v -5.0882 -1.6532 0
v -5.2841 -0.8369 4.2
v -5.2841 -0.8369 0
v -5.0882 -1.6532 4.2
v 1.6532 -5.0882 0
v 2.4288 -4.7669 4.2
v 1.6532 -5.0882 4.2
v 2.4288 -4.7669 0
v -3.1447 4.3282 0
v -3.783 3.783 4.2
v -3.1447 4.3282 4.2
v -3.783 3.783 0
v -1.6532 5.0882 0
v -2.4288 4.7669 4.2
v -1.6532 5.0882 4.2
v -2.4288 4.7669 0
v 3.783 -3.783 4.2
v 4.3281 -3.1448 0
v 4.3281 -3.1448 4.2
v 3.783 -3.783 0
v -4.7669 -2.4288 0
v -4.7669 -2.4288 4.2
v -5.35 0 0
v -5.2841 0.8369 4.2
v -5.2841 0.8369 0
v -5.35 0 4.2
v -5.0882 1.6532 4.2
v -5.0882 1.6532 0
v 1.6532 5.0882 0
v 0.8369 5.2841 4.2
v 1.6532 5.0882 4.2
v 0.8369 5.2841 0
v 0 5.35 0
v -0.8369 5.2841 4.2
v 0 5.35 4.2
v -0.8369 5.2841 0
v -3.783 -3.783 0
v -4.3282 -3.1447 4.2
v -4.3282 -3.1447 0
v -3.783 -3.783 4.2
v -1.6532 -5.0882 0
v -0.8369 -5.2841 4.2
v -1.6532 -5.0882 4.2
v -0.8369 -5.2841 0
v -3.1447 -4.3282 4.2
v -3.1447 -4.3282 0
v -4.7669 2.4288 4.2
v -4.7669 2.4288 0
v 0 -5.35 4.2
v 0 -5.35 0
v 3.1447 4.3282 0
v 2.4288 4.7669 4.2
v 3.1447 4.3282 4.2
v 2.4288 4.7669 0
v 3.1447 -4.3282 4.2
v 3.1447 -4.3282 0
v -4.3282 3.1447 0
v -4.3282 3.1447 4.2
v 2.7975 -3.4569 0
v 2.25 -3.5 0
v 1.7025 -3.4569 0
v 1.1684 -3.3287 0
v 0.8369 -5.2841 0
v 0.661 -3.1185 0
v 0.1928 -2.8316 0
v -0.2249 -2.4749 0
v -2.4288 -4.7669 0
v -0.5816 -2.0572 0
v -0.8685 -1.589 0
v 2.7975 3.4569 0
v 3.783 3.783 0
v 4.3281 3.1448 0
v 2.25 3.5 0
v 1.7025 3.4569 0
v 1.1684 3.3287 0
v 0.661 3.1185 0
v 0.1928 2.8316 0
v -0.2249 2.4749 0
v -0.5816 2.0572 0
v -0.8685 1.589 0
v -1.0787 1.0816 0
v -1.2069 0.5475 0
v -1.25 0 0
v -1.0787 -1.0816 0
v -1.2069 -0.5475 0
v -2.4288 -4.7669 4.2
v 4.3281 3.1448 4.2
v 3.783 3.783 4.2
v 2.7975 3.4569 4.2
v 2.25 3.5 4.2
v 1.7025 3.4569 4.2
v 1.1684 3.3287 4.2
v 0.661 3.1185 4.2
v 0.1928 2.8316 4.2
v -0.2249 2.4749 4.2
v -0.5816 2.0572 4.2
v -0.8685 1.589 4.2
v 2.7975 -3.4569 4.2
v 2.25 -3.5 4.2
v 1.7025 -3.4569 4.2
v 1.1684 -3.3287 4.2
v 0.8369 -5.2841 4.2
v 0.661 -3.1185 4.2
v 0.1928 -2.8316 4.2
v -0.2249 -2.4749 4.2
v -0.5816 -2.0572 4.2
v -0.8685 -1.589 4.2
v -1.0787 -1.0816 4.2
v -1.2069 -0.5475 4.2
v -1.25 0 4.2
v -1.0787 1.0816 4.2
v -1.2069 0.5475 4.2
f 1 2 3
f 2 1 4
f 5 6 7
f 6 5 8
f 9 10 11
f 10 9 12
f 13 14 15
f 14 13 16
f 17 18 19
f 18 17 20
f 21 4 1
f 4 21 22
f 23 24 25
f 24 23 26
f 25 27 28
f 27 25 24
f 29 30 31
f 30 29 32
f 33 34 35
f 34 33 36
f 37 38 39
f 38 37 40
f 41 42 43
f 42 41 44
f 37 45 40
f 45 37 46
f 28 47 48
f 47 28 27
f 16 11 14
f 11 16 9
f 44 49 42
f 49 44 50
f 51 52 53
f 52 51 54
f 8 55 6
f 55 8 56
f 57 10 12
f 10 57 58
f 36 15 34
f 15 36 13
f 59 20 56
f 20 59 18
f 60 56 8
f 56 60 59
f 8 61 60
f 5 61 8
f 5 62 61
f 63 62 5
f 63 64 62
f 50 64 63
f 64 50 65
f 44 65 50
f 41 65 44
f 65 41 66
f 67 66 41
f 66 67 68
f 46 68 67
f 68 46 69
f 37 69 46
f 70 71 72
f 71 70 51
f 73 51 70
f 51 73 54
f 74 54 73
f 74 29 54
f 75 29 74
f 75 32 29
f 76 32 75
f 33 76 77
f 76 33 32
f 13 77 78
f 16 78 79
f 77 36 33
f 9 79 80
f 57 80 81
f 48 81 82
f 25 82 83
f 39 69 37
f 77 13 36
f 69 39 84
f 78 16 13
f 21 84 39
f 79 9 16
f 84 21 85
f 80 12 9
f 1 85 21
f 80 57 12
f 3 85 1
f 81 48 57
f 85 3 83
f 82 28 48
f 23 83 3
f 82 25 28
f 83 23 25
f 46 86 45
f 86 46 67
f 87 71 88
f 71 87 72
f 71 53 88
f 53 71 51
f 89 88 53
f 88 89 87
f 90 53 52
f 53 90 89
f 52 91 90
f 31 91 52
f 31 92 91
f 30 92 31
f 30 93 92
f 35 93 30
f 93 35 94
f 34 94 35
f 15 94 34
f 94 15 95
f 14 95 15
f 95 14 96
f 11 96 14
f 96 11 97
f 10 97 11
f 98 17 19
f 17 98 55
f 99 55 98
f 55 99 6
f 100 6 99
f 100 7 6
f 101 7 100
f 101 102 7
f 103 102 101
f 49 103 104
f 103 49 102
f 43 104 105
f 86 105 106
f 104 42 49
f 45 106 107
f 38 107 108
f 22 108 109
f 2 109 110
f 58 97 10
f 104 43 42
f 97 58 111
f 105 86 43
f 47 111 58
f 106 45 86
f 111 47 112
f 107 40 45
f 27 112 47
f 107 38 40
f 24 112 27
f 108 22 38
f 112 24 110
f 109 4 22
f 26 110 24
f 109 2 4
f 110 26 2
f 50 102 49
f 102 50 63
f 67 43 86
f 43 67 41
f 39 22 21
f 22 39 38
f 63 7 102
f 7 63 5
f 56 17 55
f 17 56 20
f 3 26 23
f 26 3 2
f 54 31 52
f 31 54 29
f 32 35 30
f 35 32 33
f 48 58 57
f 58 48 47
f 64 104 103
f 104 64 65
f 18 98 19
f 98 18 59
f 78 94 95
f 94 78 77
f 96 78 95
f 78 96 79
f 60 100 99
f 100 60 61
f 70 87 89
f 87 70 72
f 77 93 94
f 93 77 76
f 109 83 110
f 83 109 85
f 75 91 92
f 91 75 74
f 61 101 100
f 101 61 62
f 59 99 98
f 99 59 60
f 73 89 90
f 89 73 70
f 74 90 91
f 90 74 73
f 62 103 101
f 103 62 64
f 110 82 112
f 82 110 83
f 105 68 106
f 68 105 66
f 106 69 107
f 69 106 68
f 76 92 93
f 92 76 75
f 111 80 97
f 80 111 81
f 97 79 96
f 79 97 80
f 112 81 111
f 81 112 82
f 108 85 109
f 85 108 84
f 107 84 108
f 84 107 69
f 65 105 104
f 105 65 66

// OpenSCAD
// [FL_INDEX: keywords="openscad, 3d_parametric, Button_cell___battery_adapter_-_use_a_small_one_for_a_big_one, csg_solid" | COT="Parametric OpenSCAD design from 3DCodeverse"]
// Title: Button cell / battery adapter - use a small one for a big one

// diameter of the original (bigger) battery
dBig=11.5;

// height of the original (bigger) battery
hBig=5.2;

// diameter of the smaller battery that you have (hole in the big one)
dSmall=7.8;

// height of the smaller battery
hSmall=5.2;

// Tolerance on height, tune according to your result
hTol=1;

// Some tolerance on the diameters (else the fit may be a bit tight)
dTol=0.8;

// The small battery protrude a bit of the big diameter
holeShift= 0.4;

// Button/Cell battery adapter
// jeremie.francois@gmail.com / http://www.thingiverse.com/MoonCactus
// http://betterprinter.blogspot.fr/
// Licence: CC-BY-NC
//
// Print temp 212 (intead of ~234 usually!), cooling enabled
// 0.2 layer thickness, 0 top and bottom layer fill
// 0.8 wall tickness
// 0% fill
// 10s minimal time between layers
// 0.4 nozzle size
//


// No need to tweak this:
$fn=0+40;
tol=0+0.1;
dBigR= dBig - dTol;
dSmallR= dSmall - dTol;
hBigR= hBig - hTol;

difference()
{
  cylinder(r=dBigR/2, h=hBigR);
  translate([(dBigR-dSmallR)/2+holeShift,0,hBigR-hSmall-tol])
  hull()
  {
    cylinder(r=dSmallR/2, h=hSmall+2*tol);
    translate([10,0,0]) cylinder(r=dSmallR/2-2, h=hSmall+2*tol);
  }
}
